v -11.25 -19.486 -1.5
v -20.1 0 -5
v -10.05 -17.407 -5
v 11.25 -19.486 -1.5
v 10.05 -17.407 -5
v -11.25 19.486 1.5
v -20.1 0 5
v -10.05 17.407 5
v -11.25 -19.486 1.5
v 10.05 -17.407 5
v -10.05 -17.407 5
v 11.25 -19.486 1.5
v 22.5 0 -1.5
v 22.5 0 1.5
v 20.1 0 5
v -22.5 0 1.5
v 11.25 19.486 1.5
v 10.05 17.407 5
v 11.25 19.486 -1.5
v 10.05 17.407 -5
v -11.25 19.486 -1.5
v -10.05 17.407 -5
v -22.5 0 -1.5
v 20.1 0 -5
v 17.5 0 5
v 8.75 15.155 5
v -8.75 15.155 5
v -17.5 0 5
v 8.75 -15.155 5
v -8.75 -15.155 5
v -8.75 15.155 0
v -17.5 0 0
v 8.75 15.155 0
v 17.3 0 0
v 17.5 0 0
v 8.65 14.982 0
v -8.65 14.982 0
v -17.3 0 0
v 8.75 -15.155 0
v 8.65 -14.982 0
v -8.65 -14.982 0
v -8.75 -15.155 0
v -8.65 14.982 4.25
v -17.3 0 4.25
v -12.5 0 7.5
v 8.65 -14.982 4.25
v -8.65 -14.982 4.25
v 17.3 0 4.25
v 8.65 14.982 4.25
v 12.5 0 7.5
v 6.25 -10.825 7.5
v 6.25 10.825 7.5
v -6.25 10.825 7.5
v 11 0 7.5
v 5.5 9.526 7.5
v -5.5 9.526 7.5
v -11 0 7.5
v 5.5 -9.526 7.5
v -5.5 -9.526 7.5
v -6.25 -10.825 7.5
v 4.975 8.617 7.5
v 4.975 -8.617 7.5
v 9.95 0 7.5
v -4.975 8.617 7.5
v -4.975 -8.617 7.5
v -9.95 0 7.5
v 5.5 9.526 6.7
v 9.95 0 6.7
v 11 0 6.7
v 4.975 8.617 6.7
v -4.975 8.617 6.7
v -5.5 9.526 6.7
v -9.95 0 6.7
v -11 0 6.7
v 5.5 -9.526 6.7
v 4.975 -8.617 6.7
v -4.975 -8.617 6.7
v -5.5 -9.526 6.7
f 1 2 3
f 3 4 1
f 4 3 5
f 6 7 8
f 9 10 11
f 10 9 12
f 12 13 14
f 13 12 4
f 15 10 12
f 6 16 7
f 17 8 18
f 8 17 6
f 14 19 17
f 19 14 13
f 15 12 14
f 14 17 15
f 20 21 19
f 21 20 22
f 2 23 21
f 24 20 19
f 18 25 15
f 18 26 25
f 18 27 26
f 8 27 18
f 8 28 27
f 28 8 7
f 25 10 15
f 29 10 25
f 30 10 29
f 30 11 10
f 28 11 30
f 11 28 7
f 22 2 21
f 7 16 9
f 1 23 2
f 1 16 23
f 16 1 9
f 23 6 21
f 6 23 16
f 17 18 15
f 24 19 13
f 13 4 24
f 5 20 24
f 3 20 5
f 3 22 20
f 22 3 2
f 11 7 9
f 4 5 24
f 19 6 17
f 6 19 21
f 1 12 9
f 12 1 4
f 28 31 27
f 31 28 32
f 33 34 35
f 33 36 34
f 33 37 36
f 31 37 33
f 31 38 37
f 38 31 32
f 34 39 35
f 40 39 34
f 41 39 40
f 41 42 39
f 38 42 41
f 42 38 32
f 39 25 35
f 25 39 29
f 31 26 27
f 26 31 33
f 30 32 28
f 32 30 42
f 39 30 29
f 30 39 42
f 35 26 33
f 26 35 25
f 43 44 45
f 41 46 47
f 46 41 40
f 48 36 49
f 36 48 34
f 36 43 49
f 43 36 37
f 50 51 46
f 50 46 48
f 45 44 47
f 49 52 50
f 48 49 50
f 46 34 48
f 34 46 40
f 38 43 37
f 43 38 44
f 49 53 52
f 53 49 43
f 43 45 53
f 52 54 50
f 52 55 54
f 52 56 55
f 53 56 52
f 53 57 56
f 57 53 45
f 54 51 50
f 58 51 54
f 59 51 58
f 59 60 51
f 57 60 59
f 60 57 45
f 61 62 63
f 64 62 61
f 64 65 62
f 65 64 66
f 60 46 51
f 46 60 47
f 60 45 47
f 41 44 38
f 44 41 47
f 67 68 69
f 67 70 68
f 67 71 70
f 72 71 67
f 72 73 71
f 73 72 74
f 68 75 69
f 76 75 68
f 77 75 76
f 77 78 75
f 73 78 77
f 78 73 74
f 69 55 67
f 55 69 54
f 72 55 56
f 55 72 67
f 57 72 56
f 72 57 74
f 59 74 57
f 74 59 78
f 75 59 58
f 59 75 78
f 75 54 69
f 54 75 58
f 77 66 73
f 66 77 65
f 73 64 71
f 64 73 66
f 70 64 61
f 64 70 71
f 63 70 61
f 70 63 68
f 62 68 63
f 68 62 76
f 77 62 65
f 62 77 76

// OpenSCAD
$fn = 6;

module ext(h) {
  translate([0, 0, -h/2])
  linear_extrude(h)
  children();
}

module setting() {
  difference() {
    hull() {
      ext(3) circle(d=45);
      ext(10) circle(d=40.2);
    }
    linear_extrude(20) circle(d=35);
  }
}

module gem() {
  slack = 0.4;
  h = 15;
  
  difference() {
    hull() {
      ext(8.5) circle(d=35-slack);
      ext(h) circle(d=25);
    }

    translate([0, 0, -25])
    cube(50, center=true);
    
    translate([0, 0, h/2-0.8])
    linear_extrude(2)
    difference() {
      circle(d=22);
      circle(d=19.9);
    }
  }
}

setting();
gem();
